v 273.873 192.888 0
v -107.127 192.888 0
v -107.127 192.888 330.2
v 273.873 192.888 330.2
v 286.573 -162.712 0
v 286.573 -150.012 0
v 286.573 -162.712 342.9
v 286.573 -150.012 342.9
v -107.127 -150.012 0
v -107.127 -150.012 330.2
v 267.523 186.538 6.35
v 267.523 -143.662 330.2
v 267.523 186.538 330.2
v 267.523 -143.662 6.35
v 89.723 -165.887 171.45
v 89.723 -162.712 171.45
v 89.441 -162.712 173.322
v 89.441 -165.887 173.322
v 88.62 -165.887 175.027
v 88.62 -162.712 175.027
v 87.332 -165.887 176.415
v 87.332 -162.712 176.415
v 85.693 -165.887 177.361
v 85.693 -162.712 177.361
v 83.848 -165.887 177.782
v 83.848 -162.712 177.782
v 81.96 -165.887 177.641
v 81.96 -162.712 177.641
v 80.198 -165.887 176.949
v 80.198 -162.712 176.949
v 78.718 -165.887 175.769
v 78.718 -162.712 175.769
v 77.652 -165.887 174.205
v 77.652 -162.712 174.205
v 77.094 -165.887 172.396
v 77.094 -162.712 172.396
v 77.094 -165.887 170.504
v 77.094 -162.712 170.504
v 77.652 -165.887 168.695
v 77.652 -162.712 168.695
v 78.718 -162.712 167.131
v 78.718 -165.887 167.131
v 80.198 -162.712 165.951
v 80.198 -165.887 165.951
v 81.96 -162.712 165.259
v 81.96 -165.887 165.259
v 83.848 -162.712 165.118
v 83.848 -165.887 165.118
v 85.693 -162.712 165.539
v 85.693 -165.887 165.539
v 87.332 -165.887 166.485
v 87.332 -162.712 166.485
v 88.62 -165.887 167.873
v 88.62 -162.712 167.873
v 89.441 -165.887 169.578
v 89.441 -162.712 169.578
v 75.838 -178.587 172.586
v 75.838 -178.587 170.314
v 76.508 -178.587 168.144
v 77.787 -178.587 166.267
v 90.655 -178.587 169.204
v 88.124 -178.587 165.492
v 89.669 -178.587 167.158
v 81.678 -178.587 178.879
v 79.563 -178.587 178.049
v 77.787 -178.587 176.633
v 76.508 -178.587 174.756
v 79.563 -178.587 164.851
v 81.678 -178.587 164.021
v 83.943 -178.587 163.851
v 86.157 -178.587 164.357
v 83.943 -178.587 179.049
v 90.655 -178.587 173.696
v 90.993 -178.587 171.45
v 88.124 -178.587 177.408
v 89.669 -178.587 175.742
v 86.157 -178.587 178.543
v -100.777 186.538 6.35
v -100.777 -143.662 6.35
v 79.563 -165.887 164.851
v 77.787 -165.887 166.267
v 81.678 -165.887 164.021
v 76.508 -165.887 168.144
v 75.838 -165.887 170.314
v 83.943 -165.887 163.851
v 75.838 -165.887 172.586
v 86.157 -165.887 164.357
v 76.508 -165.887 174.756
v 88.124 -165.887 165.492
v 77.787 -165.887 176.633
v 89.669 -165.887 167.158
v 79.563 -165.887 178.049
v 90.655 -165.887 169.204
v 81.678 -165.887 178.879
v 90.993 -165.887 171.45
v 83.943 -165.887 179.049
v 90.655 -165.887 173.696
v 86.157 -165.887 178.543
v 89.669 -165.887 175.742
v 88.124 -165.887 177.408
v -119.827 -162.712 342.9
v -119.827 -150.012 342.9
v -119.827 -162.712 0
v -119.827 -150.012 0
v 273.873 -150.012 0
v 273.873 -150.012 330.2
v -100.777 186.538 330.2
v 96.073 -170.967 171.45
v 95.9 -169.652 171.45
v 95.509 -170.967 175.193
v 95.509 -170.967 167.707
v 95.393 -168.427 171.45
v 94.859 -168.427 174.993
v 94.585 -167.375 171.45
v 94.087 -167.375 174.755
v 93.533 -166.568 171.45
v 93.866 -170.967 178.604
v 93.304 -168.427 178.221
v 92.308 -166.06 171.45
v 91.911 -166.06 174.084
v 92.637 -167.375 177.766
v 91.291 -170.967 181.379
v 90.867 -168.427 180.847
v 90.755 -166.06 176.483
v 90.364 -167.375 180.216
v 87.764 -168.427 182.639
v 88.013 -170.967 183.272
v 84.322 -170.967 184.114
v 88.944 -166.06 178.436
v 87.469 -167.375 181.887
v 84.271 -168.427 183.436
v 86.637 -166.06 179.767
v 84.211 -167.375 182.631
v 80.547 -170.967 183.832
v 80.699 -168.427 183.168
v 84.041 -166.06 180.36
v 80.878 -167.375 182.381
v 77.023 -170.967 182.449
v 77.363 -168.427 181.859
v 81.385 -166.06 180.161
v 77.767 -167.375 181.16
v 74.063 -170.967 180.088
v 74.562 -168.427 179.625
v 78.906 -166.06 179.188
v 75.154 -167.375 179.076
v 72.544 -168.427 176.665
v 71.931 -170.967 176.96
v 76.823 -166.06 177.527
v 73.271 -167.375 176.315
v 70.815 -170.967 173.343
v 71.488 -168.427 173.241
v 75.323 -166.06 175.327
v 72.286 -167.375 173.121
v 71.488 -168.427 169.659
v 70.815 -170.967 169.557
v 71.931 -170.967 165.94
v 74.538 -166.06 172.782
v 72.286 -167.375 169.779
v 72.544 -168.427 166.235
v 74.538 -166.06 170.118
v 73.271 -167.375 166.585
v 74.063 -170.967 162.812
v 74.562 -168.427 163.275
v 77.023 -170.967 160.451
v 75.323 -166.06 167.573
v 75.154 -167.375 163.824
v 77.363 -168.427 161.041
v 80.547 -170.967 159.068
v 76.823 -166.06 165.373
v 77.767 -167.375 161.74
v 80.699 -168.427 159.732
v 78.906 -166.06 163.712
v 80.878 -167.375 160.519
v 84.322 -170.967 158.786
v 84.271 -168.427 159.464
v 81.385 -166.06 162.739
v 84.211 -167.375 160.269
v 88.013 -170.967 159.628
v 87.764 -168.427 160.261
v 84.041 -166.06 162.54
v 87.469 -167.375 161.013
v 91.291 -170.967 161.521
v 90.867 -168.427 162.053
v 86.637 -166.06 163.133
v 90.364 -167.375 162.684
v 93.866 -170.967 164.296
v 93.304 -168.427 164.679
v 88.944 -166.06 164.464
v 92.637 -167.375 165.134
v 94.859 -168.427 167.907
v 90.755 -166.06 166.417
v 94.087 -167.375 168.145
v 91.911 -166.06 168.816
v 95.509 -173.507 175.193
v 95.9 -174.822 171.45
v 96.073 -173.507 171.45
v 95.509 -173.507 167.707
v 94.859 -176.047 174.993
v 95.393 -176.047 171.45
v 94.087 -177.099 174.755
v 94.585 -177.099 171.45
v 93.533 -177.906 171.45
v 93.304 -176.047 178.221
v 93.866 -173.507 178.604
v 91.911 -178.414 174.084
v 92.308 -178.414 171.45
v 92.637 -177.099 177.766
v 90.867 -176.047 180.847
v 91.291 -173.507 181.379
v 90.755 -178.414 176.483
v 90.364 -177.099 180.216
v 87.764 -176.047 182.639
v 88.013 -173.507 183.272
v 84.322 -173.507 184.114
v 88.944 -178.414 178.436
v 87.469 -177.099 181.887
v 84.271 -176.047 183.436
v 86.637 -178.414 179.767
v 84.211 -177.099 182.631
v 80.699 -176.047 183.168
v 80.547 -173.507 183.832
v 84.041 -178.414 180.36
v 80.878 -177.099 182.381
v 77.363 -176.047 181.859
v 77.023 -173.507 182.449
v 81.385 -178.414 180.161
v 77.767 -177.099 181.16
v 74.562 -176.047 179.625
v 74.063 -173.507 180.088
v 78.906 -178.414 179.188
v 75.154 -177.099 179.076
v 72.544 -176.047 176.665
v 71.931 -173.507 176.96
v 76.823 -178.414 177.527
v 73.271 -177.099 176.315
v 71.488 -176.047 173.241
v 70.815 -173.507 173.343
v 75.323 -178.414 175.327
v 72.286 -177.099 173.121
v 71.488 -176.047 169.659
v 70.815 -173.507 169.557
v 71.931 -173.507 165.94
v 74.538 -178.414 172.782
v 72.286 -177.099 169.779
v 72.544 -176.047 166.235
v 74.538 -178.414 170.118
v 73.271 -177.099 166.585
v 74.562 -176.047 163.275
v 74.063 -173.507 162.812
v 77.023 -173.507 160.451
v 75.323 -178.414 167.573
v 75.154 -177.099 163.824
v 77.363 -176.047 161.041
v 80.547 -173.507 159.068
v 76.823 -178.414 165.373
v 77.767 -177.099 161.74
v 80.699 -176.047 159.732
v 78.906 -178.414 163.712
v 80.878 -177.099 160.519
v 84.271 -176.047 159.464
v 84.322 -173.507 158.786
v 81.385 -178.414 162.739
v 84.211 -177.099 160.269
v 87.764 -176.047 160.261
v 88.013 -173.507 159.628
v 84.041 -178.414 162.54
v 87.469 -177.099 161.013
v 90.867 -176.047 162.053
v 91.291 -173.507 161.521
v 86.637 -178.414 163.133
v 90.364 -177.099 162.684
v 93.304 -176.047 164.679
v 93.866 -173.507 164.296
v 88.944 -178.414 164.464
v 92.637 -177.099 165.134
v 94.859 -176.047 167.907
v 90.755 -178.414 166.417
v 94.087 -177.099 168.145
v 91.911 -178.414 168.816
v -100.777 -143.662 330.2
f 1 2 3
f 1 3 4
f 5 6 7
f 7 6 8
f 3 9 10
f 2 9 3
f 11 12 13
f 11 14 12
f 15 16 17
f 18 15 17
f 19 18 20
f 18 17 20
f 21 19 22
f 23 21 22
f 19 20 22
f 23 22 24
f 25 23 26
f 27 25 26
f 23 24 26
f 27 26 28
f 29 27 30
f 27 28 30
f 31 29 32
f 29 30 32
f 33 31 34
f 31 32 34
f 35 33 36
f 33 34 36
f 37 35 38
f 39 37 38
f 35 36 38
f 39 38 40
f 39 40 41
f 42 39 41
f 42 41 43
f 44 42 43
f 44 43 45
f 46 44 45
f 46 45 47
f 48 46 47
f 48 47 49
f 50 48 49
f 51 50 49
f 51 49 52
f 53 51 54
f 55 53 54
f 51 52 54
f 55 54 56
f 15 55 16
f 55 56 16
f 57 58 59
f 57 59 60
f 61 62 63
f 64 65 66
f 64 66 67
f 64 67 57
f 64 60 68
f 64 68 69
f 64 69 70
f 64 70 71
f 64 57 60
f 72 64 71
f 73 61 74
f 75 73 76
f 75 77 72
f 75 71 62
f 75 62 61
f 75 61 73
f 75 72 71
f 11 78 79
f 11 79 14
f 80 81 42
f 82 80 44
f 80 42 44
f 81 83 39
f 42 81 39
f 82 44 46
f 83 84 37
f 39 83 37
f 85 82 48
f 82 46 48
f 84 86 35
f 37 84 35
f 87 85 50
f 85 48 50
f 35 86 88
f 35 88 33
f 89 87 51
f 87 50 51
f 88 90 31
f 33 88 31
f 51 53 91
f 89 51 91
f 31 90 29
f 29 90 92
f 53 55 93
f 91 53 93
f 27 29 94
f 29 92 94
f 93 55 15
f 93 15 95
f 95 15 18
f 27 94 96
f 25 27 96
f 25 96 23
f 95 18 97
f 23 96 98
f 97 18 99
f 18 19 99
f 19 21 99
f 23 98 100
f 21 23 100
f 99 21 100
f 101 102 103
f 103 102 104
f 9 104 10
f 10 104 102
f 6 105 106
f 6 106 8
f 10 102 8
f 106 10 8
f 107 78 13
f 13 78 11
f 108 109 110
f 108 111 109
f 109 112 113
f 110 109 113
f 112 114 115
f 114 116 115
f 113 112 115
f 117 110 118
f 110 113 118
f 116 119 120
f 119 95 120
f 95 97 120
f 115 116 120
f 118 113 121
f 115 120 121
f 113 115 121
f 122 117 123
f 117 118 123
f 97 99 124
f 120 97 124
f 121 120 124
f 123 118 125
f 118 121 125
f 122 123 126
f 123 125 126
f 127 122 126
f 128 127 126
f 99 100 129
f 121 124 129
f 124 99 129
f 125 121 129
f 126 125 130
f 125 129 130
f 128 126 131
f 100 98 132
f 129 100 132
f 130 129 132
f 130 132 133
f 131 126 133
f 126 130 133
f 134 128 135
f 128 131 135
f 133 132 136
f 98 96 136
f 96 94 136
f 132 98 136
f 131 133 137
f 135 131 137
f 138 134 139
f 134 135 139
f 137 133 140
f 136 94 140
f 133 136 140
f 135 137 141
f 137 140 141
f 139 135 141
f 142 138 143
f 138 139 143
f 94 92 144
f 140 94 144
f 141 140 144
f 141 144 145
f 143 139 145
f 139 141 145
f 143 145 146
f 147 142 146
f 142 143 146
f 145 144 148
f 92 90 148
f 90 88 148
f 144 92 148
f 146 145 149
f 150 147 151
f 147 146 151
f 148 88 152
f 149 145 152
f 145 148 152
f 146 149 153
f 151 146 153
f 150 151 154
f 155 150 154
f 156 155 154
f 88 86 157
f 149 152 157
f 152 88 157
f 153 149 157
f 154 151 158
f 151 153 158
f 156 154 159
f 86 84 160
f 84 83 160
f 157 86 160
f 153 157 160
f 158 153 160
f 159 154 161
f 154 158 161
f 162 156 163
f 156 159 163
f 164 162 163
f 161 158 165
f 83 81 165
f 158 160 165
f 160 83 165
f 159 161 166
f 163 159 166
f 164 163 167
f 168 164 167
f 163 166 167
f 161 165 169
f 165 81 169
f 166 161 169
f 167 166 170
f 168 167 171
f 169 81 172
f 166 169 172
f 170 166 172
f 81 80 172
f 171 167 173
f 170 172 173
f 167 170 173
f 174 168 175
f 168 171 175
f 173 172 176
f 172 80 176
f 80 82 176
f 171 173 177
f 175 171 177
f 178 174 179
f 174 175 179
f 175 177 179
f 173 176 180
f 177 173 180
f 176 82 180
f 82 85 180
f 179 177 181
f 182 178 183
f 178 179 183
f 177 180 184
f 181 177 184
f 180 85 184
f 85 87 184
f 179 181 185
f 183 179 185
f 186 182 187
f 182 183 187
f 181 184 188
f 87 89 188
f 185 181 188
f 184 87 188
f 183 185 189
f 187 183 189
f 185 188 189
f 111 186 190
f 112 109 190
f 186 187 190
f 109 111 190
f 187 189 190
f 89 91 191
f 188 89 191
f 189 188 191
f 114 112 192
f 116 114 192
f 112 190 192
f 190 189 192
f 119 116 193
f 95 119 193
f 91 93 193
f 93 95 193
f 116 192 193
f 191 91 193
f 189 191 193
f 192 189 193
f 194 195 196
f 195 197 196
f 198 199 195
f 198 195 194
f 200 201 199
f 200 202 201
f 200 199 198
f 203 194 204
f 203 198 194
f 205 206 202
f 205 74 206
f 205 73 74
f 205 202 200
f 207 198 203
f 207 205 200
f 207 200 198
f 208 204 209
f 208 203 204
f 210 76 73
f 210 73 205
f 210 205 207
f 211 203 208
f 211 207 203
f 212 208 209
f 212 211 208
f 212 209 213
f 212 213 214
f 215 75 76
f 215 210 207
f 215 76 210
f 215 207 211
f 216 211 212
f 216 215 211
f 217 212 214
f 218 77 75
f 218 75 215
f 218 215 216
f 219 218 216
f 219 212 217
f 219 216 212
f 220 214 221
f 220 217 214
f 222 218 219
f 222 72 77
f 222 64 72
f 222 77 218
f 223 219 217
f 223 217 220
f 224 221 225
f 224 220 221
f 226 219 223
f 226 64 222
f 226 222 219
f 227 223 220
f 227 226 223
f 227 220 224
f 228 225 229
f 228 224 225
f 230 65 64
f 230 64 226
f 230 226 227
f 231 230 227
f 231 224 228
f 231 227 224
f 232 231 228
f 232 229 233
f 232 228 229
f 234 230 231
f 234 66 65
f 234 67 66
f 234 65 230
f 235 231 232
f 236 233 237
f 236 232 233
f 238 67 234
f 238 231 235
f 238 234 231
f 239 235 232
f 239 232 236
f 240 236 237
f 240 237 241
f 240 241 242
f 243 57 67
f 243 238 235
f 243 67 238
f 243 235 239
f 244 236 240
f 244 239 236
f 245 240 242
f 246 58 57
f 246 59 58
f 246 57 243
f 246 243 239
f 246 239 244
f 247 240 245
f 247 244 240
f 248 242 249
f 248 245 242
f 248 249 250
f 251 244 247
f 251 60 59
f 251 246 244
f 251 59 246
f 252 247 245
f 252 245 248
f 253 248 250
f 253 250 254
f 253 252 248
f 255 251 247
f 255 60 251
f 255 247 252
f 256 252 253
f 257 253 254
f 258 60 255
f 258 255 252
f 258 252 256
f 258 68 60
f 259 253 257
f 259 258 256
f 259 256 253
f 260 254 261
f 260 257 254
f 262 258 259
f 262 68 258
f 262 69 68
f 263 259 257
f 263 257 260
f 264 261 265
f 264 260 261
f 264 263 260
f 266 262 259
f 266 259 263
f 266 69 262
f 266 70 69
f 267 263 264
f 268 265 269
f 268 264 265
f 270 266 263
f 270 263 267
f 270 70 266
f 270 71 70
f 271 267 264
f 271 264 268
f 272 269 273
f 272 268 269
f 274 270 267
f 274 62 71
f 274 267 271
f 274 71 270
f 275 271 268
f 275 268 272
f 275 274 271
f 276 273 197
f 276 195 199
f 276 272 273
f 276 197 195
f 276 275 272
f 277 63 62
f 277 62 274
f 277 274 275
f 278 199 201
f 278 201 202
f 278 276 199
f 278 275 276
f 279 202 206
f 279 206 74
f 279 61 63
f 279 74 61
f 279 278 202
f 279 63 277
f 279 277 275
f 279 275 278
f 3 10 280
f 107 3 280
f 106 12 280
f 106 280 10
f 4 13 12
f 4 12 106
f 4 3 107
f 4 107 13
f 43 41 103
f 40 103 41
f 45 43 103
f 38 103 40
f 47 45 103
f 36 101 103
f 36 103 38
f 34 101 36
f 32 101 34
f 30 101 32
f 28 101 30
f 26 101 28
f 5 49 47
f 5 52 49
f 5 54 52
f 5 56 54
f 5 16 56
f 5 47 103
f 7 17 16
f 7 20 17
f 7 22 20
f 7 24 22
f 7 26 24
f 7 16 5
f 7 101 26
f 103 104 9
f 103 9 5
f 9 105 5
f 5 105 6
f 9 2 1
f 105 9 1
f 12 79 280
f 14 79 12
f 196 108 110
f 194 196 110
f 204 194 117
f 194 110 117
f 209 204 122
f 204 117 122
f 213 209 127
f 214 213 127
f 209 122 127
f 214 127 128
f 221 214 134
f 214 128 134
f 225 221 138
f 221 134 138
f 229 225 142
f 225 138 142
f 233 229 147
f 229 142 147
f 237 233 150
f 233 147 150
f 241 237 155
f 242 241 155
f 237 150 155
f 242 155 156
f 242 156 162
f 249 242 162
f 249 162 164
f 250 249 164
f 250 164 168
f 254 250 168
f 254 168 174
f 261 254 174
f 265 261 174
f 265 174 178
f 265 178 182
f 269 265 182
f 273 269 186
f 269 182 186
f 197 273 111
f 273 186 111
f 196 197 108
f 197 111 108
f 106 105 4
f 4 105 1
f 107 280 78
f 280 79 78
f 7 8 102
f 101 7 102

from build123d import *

# Parameters (mm, degrees)
F0_W     = 381
F0_H     = 342.9
F1_DEPTH = 330.2
F2_T     = -6.35
F4_DEPTH = 12.7
F5_R     = 6.35
F6_DEPTH = 3.175
F7_R     = 12.7
F8_DEPTH = 12.7
F9_R     = 5.08


with BuildPart() as f1:
    # F0 (on Top) → F1 (new body)
    with BuildSketch(Plane.XY):
        with Locations((83.37315, 21.438057)):
            Rectangle(F0_W, F0_H)
    extrude(amount=F1_DEPTH)

    # F2
    f2_openings = [f1.faces().sort_by_distance(p)[0] for p in [
        (83.37315, 21.438057, 330.2),
    ]]
    offset(amount=F2_T, openings=f2_openings)

    # F3 (on face) → F4 (join)
    with BuildSketch(Plane.XZ.offset(150.011943)):
        Polygon((286.57315, 0), (286.57315, 342.9), (-119.82685, 342.9), (-119.82685, 0), (-107.12685, 0), (273.87315, 0), align=None)
    extrude(amount=F4_DEPTH)

    # F5 (on face) → F6 (join)
    with BuildSketch(Plane.XZ.offset(162.711943)):
        with Locations((83.37315, 171.45)):
            Circle(F5_R)
    extrude(amount=F6_DEPTH)

    # F7 (on face) → F8 (join)
    with BuildSketch(Plane.XZ.offset(165.886943)):
        with Locations((83.37315, 171.45)):
            Circle(F7_R)
    extrude(amount=F8_DEPTH)

    # F9
    f9_edges = [f1.edges().sort_by_distance(p)[0] for p in [
        (70.67315, -178.586943, 171.45),
        (70.67315, -165.886943, 171.45),
    ]]
    fillet(f9_edges, radius=F9_R)


solid = f1.part
